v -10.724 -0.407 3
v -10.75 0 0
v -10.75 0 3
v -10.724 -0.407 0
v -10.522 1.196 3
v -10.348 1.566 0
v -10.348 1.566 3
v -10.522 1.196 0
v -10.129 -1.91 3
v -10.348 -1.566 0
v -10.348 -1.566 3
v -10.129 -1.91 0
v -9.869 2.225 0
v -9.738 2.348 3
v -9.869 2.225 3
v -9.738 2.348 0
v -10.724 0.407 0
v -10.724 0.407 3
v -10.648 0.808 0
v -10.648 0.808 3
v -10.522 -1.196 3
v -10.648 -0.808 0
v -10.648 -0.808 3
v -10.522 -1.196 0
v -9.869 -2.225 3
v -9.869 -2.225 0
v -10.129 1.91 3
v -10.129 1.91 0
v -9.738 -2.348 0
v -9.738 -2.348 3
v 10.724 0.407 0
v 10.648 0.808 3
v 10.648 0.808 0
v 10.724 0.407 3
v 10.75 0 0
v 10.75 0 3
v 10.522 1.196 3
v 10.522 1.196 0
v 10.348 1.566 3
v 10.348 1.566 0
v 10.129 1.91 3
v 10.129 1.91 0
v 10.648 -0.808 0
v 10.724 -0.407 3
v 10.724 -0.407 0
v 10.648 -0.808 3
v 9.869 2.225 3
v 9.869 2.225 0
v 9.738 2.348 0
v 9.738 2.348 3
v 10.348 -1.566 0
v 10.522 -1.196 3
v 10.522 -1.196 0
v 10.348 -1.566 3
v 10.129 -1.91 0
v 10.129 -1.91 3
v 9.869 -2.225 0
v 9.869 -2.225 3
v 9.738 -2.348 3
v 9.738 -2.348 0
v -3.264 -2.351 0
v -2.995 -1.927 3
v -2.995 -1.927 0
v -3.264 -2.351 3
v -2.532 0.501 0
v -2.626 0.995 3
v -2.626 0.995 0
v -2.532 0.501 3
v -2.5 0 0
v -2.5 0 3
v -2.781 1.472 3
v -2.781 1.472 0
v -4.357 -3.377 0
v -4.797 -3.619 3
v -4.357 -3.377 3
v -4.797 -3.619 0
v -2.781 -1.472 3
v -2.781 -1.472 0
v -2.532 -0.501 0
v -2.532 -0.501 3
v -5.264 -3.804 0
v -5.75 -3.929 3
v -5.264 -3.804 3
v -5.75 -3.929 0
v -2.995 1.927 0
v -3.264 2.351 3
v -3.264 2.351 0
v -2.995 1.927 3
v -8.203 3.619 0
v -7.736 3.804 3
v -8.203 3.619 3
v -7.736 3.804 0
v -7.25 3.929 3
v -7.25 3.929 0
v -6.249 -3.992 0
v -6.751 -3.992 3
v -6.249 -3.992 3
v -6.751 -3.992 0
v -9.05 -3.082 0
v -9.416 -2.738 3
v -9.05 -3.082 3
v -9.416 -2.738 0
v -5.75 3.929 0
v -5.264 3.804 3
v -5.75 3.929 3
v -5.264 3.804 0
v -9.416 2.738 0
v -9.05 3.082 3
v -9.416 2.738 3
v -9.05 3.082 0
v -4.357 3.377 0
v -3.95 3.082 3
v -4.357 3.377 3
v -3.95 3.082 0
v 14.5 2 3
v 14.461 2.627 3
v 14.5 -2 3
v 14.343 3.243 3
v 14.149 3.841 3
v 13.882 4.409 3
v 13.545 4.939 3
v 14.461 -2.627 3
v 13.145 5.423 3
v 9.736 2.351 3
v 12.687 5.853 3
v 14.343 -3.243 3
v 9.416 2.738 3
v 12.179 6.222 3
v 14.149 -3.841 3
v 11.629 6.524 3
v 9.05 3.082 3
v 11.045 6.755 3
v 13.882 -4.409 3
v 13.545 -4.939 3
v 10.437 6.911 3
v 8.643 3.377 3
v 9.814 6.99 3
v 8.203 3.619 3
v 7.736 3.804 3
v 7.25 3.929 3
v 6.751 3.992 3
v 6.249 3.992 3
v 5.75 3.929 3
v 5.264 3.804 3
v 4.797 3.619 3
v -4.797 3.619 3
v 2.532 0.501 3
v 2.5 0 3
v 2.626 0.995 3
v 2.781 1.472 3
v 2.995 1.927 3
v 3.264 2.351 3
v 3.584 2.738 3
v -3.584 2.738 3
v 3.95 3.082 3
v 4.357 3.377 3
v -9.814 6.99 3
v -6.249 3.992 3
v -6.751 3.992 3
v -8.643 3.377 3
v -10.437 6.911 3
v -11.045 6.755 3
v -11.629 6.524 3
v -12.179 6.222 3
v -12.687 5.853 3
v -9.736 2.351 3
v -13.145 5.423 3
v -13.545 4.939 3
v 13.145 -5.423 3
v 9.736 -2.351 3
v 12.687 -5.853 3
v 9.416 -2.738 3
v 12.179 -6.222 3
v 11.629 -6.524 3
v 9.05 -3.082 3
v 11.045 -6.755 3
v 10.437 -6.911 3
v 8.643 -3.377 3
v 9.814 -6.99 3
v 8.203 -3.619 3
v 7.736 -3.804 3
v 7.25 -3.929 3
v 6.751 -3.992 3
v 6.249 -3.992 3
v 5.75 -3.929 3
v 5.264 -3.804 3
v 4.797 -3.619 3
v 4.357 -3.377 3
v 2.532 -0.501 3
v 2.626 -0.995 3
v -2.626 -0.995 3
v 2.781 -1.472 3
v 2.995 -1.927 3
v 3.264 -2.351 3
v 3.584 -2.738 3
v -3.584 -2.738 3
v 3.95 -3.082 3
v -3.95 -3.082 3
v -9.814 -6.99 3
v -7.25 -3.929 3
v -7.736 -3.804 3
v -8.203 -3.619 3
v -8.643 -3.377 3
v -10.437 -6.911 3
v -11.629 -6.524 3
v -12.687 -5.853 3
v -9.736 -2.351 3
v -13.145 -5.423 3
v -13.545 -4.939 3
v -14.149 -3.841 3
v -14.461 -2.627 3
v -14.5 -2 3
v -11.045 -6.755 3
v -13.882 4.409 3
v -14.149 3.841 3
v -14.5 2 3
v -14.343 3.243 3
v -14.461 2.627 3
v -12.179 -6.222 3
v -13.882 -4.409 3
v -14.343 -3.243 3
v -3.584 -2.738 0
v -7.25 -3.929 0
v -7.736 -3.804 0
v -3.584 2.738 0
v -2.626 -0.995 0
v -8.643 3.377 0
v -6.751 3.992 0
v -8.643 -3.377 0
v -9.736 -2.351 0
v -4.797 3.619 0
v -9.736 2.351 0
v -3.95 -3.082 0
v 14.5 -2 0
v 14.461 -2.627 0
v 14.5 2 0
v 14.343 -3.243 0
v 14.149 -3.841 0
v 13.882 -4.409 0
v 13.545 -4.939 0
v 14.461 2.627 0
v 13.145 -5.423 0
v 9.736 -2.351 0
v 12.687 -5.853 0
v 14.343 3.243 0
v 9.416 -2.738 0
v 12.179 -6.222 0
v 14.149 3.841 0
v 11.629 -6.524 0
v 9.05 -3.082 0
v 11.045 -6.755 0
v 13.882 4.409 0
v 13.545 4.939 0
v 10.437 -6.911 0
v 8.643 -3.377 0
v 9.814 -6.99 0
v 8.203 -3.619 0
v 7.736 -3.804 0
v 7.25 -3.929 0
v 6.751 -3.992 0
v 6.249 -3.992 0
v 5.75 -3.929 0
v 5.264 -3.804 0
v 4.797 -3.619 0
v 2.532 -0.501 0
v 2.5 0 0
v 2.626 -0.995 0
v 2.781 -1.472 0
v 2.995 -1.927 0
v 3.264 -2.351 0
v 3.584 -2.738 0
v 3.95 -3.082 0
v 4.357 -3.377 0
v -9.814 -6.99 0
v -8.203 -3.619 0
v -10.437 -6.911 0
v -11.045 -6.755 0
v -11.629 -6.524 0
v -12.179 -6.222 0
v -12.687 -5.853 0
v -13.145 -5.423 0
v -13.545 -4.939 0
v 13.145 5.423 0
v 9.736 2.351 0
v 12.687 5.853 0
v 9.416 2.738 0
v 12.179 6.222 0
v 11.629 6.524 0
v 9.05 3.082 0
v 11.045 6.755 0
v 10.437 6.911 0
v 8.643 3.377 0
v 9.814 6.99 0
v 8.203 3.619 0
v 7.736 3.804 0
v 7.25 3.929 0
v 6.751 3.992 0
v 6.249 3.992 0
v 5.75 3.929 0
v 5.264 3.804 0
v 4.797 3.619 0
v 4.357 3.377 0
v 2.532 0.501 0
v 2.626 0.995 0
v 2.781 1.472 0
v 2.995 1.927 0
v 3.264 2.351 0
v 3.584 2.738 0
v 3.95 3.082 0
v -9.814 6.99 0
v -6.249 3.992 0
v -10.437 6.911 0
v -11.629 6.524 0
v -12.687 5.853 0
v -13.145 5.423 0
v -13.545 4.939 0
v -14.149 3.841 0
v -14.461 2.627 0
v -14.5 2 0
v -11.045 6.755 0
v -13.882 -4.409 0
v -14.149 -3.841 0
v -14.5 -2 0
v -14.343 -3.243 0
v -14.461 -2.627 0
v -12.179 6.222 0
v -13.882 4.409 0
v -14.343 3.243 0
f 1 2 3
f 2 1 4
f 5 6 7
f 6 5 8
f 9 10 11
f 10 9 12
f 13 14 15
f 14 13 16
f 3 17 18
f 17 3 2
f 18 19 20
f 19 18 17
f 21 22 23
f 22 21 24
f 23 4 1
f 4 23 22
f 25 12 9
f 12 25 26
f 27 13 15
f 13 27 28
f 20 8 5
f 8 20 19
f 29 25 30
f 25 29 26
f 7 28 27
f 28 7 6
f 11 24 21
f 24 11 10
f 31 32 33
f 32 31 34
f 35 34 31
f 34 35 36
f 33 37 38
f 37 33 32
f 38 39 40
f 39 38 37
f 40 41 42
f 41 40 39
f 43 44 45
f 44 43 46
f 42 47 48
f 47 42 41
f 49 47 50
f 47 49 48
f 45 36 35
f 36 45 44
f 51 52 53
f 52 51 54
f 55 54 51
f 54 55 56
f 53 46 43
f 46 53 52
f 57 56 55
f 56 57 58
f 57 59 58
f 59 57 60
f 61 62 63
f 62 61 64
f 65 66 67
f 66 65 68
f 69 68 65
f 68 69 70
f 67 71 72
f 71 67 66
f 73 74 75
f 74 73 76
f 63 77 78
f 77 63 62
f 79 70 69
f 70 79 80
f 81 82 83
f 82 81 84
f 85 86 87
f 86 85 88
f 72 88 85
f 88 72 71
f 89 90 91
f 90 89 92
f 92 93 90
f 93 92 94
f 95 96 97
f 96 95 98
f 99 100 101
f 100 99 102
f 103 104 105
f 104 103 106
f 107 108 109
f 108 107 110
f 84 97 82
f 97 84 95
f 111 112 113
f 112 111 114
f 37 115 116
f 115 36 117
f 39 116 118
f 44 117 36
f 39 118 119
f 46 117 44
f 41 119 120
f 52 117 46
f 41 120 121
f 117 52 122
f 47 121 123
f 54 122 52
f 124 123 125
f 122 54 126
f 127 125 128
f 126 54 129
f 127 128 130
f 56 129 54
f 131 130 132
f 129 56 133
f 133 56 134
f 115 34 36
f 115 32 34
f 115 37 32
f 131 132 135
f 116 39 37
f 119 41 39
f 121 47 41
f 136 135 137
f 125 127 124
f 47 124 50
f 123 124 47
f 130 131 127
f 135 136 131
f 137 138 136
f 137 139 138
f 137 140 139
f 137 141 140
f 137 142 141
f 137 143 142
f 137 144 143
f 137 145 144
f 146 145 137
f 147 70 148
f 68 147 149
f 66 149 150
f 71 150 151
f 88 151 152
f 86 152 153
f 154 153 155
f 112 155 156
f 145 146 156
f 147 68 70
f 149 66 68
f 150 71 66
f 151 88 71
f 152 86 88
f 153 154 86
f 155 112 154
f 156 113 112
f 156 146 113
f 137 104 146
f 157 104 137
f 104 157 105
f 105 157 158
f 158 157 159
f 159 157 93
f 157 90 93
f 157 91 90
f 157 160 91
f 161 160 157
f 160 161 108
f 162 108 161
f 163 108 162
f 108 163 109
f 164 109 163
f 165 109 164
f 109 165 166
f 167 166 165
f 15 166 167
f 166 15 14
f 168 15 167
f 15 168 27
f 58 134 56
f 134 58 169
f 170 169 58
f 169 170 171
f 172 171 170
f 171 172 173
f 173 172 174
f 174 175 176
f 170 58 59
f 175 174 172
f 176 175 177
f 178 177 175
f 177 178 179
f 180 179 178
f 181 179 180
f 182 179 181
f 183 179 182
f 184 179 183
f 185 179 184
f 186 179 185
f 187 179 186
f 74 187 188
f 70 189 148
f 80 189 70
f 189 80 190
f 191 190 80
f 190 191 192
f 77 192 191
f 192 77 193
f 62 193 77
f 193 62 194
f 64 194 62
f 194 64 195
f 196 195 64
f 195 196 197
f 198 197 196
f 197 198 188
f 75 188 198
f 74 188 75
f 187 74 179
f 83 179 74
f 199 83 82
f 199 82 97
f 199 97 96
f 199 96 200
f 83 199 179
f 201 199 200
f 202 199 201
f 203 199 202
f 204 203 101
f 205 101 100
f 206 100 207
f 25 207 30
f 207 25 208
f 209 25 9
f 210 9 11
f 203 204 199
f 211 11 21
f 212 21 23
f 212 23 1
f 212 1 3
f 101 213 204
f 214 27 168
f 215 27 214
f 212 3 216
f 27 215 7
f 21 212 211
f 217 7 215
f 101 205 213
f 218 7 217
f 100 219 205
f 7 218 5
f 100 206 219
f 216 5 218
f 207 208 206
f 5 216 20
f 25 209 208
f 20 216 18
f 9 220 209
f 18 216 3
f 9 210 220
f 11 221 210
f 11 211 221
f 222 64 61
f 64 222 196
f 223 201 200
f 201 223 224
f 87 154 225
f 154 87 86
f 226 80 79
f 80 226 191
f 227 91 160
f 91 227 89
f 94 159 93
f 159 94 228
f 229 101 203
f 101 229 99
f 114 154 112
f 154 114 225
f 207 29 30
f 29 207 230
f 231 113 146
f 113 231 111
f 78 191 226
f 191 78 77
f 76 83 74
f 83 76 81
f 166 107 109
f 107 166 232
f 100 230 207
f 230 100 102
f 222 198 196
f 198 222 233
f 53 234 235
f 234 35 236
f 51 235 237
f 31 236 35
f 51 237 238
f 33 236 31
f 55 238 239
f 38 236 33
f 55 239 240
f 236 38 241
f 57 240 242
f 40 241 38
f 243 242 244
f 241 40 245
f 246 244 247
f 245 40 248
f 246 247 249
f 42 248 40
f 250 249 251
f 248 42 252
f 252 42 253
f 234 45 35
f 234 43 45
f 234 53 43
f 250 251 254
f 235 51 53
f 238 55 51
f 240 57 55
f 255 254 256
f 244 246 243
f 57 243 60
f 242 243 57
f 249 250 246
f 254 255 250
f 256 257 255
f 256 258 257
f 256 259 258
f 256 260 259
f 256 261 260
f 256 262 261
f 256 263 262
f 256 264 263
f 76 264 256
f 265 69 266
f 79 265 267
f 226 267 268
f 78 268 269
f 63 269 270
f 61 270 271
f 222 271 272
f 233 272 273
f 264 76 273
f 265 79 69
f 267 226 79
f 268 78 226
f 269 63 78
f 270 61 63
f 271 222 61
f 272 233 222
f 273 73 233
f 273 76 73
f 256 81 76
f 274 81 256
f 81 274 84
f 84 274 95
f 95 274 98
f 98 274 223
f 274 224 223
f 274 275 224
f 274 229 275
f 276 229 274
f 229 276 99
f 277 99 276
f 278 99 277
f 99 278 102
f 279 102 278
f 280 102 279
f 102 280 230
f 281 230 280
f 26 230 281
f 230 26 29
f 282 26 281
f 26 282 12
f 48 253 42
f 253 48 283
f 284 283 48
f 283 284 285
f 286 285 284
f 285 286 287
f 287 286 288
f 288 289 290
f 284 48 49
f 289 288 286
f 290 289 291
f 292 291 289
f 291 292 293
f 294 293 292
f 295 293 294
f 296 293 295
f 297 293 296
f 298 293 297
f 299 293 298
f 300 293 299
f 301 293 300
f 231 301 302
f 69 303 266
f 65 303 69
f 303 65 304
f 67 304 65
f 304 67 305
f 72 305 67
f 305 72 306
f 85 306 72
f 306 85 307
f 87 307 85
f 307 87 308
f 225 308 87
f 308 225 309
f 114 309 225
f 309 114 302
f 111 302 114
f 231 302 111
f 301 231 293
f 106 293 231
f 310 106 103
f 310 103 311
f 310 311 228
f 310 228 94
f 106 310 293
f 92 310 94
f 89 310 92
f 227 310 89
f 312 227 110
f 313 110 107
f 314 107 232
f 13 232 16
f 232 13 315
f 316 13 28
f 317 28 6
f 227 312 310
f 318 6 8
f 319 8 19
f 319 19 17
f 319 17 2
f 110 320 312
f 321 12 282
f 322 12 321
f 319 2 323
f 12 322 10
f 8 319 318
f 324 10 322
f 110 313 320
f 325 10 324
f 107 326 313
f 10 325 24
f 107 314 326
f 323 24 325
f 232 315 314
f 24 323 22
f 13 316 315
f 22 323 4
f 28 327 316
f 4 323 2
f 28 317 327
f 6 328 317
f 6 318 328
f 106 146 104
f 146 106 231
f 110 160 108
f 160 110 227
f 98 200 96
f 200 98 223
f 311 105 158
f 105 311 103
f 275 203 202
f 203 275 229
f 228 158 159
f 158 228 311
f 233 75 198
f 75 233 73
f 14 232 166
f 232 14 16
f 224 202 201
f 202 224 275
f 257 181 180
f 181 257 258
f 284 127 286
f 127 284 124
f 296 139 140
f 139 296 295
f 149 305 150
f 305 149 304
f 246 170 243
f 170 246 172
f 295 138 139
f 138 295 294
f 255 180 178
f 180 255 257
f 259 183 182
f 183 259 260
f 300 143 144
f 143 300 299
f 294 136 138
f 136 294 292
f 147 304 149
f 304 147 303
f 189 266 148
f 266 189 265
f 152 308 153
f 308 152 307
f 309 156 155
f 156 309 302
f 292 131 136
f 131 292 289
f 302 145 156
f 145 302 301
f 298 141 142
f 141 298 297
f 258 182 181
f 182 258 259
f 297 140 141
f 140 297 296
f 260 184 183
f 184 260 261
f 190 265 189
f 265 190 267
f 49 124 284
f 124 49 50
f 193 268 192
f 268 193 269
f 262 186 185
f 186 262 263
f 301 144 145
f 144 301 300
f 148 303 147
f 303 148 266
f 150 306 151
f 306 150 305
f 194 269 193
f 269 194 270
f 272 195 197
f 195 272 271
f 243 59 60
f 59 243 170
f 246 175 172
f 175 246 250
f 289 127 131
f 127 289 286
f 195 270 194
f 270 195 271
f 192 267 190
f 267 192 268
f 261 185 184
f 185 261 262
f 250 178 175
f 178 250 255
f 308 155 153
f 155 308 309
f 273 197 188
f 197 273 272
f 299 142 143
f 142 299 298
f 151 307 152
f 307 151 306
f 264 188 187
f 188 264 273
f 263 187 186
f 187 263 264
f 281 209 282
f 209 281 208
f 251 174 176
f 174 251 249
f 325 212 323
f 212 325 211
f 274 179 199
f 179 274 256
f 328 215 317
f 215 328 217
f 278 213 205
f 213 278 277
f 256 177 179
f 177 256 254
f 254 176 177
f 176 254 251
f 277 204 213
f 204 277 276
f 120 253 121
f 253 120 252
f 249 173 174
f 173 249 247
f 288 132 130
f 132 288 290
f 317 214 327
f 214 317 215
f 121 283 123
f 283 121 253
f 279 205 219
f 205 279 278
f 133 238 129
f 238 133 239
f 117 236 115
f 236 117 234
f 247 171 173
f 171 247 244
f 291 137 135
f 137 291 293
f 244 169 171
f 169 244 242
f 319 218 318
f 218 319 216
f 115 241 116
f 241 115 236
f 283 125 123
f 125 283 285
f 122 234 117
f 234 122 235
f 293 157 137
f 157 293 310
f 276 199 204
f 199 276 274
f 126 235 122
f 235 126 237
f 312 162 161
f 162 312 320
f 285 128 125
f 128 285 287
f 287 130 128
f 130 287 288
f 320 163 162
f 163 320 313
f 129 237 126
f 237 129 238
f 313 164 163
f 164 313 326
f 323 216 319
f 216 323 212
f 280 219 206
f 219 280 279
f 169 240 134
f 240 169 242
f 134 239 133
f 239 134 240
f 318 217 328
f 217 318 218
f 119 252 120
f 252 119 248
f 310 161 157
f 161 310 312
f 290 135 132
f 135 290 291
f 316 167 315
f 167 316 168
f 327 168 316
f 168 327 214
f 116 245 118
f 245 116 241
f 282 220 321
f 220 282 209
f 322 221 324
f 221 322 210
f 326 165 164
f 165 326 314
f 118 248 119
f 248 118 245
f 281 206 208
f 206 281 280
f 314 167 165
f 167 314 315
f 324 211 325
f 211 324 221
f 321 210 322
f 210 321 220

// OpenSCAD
$fn = 50;


difference() {
	union() {
		hull() {
			translate(v = [-9.5000000000, 2.0000000000, 0]) {
				cylinder(h = 3, r = 5);
			}
			translate(v = [9.5000000000, 2.0000000000, 0]) {
				cylinder(h = 3, r = 5);
			}
			translate(v = [-9.5000000000, -2.0000000000, 0]) {
				cylinder(h = 3, r = 5);
			}
			translate(v = [9.5000000000, -2.0000000000, 0]) {
				cylinder(h = 3, r = 5);
			}
		}
	}
	union() {
		#translate(v = [-7.5000000000, 0.0000000000, -100.0000000000]) {
			cylinder(h = 200, r = 3.2500000000);
		}
		#translate(v = [-7.5000000000, 0.0000000000, -100.0000000000]) {
			cylinder(h = 200, r = 3.2500000000);
		}
		#translate(v = [7.5000000000, 0.0000000000, -100.0000000000]) {
			cylinder(h = 200, r = 3.2500000000);
		}
		#translate(v = [7.5000000000, 0.0000000000, -100.0000000000]) {
			cylinder(h = 200, r = 3.2500000000);
		}
		#translate(v = [-6.5000000000, 0, 0]) {
			cylinder(h = 3, r = 4.0000000000);
		}
		#translate(v = [6.5000000000, 0, 0]) {
			cylinder(h = 3, r = 4.0000000000);
		}
	}
}
